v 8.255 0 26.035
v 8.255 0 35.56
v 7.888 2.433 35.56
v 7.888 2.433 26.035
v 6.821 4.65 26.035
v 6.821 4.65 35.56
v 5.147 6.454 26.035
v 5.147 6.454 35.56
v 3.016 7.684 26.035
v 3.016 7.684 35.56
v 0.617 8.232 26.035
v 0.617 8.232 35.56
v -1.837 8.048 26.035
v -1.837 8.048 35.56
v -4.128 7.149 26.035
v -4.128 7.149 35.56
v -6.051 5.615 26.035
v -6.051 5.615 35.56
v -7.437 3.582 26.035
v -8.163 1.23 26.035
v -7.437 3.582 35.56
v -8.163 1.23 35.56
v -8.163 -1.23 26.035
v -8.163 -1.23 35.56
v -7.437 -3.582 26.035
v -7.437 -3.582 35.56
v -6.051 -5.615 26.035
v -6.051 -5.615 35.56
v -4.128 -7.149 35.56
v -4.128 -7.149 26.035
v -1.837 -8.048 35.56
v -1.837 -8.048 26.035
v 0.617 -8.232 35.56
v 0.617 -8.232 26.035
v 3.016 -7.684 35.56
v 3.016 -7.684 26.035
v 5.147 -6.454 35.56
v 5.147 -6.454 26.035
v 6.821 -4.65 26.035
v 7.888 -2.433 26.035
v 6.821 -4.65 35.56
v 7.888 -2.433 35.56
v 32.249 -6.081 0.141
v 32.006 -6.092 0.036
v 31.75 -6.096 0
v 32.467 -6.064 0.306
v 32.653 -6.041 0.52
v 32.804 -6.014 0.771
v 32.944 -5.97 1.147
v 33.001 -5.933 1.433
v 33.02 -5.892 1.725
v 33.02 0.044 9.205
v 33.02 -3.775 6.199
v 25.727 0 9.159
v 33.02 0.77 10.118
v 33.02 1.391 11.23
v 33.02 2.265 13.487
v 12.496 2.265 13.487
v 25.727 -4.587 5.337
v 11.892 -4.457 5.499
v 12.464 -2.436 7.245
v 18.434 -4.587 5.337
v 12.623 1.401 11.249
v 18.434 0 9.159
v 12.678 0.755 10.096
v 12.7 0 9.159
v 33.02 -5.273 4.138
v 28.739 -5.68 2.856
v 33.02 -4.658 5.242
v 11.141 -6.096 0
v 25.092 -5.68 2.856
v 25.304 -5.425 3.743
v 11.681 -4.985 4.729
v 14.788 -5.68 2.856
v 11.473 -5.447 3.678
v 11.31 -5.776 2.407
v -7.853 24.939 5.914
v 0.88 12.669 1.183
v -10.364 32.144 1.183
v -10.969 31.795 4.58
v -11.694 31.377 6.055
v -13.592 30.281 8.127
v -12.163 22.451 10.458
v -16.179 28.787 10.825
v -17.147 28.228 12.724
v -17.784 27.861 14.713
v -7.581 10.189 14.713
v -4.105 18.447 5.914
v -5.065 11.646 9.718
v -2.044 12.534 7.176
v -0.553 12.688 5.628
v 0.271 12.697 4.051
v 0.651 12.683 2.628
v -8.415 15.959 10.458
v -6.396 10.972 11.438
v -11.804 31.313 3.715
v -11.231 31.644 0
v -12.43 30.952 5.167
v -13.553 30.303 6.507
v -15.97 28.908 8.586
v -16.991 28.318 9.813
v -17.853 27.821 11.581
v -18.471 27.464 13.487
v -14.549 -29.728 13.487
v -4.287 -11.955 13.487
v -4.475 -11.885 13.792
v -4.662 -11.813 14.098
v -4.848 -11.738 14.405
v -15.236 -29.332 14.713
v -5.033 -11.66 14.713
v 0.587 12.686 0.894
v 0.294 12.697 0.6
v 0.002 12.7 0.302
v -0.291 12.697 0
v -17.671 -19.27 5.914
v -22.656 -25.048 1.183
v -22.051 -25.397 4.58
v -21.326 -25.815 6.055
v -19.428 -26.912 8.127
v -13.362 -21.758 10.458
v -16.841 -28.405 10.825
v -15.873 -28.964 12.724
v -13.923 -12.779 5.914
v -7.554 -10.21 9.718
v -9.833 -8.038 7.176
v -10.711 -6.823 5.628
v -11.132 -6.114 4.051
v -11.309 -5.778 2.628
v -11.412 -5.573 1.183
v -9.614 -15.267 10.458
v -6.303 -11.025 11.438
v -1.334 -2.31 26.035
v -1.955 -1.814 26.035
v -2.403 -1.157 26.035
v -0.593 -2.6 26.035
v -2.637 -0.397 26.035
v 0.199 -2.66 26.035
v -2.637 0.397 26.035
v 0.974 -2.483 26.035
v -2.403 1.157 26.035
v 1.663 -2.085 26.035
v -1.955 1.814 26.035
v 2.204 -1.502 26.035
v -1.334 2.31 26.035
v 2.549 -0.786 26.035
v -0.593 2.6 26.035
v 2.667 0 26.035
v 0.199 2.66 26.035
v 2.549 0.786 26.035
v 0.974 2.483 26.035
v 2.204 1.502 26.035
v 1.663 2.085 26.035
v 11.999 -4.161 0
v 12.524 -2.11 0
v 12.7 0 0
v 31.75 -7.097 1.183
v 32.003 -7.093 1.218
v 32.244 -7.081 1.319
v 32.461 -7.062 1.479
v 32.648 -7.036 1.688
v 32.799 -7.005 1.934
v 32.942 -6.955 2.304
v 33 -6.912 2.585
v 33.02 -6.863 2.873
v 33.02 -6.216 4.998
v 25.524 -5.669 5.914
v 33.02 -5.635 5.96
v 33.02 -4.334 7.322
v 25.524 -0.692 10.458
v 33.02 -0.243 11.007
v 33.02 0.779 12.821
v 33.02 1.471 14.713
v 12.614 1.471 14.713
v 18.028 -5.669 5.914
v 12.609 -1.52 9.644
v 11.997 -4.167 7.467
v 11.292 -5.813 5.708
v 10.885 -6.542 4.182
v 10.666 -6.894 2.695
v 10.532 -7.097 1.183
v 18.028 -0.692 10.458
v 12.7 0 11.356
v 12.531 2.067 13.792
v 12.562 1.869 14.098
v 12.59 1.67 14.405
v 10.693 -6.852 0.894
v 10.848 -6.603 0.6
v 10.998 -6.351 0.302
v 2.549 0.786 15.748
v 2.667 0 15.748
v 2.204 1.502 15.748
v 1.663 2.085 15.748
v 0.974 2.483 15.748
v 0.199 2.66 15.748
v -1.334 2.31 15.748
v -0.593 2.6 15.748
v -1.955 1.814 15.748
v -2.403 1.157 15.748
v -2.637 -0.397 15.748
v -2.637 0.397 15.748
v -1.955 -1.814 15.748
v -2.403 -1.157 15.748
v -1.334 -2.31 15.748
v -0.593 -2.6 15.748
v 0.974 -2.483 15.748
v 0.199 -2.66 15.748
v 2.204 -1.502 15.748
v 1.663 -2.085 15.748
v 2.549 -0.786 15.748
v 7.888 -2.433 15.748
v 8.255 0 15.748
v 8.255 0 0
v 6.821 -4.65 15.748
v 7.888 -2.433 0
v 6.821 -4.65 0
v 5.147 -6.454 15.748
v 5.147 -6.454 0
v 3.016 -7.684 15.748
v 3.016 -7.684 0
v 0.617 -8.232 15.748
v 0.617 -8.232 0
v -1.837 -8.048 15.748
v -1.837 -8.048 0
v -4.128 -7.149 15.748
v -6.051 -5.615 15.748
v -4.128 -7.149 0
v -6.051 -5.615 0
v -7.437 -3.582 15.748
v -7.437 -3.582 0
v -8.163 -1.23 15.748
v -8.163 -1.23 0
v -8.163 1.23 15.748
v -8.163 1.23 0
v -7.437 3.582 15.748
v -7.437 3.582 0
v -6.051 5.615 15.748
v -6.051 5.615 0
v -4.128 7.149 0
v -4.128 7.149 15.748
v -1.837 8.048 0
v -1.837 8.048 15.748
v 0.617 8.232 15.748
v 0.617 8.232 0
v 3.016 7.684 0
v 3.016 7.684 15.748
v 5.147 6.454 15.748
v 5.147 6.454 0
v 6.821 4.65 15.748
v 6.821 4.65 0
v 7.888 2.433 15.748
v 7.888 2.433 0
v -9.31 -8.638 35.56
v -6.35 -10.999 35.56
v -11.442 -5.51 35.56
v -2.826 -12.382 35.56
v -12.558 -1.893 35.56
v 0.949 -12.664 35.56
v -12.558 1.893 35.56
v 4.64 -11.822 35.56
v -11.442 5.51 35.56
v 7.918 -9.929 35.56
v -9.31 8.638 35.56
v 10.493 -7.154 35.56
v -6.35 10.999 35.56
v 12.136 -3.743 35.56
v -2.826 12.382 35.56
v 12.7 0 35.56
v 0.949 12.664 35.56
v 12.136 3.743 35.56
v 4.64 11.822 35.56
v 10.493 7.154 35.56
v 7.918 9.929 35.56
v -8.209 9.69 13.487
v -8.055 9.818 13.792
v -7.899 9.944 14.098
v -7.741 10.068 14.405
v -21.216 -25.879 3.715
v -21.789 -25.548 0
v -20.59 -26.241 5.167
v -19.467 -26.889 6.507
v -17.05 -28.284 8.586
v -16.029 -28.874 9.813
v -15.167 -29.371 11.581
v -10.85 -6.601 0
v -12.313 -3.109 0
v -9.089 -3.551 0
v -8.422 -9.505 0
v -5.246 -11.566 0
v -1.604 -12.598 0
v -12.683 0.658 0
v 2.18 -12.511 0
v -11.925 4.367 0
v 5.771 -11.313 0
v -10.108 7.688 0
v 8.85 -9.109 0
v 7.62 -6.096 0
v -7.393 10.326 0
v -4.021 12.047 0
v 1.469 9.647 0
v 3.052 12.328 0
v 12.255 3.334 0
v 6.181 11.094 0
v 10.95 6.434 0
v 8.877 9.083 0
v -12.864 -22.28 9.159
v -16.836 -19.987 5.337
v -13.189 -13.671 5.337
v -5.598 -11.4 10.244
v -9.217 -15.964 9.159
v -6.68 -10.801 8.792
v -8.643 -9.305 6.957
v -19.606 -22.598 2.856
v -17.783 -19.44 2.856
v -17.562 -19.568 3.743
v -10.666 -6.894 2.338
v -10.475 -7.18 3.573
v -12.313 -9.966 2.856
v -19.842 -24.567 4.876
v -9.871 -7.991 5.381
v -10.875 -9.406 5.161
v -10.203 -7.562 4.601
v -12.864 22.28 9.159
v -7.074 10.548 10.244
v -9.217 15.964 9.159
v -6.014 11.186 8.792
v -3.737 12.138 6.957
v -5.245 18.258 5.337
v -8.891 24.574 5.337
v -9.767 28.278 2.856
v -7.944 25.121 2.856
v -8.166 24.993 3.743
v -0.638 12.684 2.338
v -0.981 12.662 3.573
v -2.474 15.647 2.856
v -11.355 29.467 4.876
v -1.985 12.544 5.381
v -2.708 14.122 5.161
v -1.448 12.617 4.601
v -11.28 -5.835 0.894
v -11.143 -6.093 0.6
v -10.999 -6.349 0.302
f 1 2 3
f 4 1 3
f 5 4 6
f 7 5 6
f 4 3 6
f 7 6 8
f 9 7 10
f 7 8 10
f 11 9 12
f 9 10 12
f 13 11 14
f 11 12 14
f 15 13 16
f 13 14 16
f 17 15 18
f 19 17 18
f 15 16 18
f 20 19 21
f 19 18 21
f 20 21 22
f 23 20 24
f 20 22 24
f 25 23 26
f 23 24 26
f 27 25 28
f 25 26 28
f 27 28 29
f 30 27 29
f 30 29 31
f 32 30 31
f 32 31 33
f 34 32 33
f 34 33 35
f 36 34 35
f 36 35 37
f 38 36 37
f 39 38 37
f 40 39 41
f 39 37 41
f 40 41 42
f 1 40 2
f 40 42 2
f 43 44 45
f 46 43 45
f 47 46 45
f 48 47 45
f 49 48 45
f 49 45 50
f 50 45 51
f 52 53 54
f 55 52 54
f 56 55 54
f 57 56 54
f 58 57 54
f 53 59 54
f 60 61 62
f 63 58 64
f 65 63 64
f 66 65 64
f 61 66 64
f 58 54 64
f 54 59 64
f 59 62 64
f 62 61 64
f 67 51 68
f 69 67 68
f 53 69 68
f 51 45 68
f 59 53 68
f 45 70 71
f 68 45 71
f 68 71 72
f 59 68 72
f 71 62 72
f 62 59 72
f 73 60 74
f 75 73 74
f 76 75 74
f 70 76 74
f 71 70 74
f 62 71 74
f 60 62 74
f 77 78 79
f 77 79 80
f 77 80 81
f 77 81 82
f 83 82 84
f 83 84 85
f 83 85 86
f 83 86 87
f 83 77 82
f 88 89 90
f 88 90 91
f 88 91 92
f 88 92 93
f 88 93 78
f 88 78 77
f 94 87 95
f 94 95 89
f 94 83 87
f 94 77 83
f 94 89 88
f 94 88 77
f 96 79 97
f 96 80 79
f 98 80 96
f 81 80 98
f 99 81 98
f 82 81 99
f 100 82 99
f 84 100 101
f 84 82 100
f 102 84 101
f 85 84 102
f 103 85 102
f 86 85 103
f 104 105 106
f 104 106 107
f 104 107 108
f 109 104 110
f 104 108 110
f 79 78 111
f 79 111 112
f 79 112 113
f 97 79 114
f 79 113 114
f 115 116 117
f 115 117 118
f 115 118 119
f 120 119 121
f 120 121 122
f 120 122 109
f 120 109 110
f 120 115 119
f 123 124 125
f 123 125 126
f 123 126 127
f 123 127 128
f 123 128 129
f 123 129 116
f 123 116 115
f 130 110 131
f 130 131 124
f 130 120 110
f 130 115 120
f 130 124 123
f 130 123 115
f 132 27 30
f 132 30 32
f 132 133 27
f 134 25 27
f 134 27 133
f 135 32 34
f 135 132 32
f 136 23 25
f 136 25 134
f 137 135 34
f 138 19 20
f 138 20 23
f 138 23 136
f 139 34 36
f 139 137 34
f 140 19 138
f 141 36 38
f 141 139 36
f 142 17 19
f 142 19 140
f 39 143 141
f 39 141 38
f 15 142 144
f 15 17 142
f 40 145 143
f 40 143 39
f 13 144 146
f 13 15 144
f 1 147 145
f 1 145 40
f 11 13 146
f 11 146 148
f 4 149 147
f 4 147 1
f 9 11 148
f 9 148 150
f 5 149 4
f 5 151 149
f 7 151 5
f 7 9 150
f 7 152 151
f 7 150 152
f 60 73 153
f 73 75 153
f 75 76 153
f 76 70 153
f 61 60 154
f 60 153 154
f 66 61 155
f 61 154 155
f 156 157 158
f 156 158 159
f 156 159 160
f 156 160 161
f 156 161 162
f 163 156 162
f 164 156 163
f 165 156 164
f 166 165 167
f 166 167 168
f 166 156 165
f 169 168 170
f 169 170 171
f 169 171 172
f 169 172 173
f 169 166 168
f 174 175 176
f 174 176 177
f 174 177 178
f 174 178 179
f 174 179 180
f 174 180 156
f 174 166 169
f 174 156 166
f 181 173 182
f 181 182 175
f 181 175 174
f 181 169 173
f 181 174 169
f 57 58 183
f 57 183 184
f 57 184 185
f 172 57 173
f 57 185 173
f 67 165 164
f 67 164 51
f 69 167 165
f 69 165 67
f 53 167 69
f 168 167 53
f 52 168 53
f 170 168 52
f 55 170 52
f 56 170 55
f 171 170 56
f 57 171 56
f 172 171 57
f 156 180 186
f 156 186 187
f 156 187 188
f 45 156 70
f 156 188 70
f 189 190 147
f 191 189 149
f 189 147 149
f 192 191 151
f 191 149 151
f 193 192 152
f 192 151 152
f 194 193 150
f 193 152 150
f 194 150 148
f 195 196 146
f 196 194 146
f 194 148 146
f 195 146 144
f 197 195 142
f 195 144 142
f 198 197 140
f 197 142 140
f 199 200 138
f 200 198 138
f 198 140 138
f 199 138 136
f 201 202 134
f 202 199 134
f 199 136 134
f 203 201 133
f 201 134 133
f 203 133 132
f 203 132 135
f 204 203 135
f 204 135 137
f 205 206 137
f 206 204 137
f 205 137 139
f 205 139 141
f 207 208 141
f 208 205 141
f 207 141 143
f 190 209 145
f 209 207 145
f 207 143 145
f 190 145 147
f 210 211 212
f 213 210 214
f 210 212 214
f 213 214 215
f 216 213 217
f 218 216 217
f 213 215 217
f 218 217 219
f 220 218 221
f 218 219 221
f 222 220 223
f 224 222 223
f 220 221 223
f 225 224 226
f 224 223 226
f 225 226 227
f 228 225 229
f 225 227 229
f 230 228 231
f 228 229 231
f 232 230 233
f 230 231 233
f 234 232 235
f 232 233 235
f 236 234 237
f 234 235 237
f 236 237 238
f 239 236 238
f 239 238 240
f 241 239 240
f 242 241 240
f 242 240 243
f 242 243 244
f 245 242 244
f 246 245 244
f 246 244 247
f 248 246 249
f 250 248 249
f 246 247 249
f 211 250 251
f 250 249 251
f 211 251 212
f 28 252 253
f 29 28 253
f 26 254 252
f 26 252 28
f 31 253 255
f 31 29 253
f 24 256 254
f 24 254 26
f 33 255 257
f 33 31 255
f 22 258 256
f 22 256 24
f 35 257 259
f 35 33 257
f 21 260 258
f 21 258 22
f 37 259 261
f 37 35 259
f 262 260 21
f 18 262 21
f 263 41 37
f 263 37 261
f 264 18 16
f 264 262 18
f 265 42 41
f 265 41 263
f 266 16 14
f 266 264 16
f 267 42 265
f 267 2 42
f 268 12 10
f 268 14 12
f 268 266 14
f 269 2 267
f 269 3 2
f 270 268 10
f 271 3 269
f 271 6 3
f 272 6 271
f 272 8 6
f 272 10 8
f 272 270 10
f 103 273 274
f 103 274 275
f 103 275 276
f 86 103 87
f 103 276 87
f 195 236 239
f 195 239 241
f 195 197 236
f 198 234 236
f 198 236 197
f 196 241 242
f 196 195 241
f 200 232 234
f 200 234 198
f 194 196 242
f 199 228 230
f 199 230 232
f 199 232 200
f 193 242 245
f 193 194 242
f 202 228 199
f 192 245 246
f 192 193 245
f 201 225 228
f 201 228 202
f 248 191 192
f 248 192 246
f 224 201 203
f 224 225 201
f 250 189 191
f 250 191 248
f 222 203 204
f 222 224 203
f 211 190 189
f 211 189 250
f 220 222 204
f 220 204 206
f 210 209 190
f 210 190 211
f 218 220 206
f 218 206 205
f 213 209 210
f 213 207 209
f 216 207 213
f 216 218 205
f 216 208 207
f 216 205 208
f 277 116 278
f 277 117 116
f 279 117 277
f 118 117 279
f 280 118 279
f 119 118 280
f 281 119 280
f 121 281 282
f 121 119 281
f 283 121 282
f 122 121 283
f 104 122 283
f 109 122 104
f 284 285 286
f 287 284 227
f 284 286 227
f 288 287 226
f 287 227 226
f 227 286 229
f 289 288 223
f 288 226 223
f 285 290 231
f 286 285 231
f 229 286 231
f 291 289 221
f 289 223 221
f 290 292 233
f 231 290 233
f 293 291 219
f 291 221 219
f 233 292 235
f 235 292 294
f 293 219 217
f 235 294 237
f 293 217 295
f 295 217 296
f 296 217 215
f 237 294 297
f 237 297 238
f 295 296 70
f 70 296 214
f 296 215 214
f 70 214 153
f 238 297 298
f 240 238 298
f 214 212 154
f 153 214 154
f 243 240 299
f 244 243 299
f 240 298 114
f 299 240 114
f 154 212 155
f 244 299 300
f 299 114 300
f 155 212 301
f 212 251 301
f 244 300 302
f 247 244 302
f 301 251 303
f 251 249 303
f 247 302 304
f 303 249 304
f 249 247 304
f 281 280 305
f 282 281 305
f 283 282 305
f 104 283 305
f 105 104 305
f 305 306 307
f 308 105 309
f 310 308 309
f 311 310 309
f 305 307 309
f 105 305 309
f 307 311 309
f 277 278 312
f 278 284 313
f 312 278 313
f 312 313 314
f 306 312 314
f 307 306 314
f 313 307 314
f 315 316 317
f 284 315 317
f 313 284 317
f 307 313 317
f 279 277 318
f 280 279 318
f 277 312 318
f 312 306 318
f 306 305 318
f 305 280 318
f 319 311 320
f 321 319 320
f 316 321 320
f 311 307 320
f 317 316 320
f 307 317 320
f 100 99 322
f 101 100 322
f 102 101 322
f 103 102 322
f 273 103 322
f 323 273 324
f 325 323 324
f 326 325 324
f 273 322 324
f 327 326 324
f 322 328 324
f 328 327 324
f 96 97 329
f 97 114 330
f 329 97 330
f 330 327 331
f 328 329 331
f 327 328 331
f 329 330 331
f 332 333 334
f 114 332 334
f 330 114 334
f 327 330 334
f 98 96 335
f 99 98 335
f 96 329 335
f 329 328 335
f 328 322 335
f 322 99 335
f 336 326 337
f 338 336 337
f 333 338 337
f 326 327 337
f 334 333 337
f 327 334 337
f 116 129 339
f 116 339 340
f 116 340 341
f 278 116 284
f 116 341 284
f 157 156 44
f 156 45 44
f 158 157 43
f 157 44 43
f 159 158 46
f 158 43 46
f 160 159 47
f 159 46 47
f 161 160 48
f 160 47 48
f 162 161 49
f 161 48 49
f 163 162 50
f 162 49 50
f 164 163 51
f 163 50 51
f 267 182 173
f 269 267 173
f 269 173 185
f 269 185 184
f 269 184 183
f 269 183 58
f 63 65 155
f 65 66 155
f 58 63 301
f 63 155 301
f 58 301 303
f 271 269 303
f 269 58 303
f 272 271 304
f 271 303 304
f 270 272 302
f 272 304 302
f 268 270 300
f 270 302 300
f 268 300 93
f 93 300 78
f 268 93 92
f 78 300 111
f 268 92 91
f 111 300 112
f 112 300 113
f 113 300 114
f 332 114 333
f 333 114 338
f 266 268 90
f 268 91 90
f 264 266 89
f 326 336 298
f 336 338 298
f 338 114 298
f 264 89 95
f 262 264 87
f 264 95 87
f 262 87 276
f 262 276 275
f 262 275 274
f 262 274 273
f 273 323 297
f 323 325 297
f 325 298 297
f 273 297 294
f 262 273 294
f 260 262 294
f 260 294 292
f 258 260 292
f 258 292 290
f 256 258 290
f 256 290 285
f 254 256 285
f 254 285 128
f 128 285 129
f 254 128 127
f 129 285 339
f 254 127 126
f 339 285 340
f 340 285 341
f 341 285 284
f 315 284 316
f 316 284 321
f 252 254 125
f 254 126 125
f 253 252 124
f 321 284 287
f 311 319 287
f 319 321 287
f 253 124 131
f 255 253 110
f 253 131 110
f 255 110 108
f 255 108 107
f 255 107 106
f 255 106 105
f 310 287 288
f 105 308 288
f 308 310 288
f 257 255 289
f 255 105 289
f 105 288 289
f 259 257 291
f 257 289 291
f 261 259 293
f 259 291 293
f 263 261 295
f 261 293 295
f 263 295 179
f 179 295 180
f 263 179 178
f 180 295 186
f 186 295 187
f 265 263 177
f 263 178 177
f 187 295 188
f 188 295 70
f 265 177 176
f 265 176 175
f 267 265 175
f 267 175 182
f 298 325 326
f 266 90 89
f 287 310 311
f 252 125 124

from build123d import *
from build123d import SkipClean  # not in build123d's __all__

# Parameters (mm, degrees)
F0_R            = 12.7
F1_DEPTH        = 35.56
F2_R            = 8.255
F3_DEPTH        = 9.525
F4_R            = 2.667
F5_DEPTH        = 254
F9_DEPTH        = 25.4
F9_COPIES_COUNT = 3
F10_R           = 1.27
F6_R            = 8.255
F6_R_2          = 2.667
F11_DEPTH       = 15.748


# Not quite as in the source:
# - a pattern or mirror of a feature is missing from the dataset's text; its kind, count and spacing are read off the source's solid
# - a feature names something its author has since deleted; it is built from what else it names


with BuildPart() as f1:
    # F0 (on Top) → F1 (new body)
    with BuildSketch(Plane.XY):
        Circle(F0_R)
    extrude(amount=F1_DEPTH)

    # F2 (on face) → F3 (cut)
    with BuildSketch(Plane.XY.offset(35.56)):
        Circle(F2_R)
    extrude(amount=-F3_DEPTH, mode=Mode.SUBTRACT)

    # F4 (on face) → F5 (cut)
    with BuildSketch(Plane.XY.offset(26.035)):
        Circle(F4_R)
    extrude(amount=-F5_DEPTH, mode=Mode.SUBTRACT)

    # F8 (on offset) → F9 (join)
    with BuildSketch(Plane.YZ.offset(7.62)):
        with BuildLine():
            Line((-7.096601933, 1.1829776548), (-6.096, 0))
            add(Edge.make_bspline(
                [(-6.096, 0), (-5.8943346547, 1.9452293607), (-5.4834307395, 5.9087381092), (0.5997187932, 8.6736721856), (1.7285446911, 11.9368345808), (2.2646340076, 13.4865390137)],
                knots=[0, 0, 0, 0, 0.3360272787, 0.6846735329, 1, 1, 1, 1], degree=3))
            Line((2.2646340076, 13.4865390137), (1.47131423, 14.712578617))
            add(Edge.make_bspline(
                [(-7.096601933, 1.1829776548), (-6.9020267489, 2.8395199903), (-6.4802421103, 6.4304409685), (-0.1009646663, 10.0195226908), (0.978146166, 13.2405336059), (1.47131423, 14.712578617)],
                knots=[0, 0, 0, 0, 0.3174047687, 0.6880448619, 1, 1, 1, 1], degree=3))
        make_face()
    with SkipClean():  # cleaning this boolean's faces spoils the solid; the shape is the same uncleaned
        f9 = extrude(amount=F9_DEPTH)

    # F9_copies: F9 ×3 about axis
    f9_copies_axis = Axis((0, 0, 0), (0, 0, 1))
    for i in range(1, F9_COPIES_COUNT):
        add(f9.rotate(f9_copies_axis, i * 360 / F9_COPIES_COUNT), clean=False)

    # F10
    f10_edges = [f1.edges().sort_by_distance(p)[0] for p in [
        (33.02, -6.596301, 0.591489),
    ]]
    fillet(f10_edges, radius=F10_R)

    # F6 (on face) → F11 (cut)
    with BuildSketch(Plane(origin=(0, 0, 0), x_dir=(1, 0, 0), z_dir=(0, 0, -1))):
        Circle(F6_R)
        Circle(F6_R_2, mode=Mode.SUBTRACT)
    extrude(amount=-F11_DEPTH, mode=Mode.SUBTRACT)


solid = f1.part
